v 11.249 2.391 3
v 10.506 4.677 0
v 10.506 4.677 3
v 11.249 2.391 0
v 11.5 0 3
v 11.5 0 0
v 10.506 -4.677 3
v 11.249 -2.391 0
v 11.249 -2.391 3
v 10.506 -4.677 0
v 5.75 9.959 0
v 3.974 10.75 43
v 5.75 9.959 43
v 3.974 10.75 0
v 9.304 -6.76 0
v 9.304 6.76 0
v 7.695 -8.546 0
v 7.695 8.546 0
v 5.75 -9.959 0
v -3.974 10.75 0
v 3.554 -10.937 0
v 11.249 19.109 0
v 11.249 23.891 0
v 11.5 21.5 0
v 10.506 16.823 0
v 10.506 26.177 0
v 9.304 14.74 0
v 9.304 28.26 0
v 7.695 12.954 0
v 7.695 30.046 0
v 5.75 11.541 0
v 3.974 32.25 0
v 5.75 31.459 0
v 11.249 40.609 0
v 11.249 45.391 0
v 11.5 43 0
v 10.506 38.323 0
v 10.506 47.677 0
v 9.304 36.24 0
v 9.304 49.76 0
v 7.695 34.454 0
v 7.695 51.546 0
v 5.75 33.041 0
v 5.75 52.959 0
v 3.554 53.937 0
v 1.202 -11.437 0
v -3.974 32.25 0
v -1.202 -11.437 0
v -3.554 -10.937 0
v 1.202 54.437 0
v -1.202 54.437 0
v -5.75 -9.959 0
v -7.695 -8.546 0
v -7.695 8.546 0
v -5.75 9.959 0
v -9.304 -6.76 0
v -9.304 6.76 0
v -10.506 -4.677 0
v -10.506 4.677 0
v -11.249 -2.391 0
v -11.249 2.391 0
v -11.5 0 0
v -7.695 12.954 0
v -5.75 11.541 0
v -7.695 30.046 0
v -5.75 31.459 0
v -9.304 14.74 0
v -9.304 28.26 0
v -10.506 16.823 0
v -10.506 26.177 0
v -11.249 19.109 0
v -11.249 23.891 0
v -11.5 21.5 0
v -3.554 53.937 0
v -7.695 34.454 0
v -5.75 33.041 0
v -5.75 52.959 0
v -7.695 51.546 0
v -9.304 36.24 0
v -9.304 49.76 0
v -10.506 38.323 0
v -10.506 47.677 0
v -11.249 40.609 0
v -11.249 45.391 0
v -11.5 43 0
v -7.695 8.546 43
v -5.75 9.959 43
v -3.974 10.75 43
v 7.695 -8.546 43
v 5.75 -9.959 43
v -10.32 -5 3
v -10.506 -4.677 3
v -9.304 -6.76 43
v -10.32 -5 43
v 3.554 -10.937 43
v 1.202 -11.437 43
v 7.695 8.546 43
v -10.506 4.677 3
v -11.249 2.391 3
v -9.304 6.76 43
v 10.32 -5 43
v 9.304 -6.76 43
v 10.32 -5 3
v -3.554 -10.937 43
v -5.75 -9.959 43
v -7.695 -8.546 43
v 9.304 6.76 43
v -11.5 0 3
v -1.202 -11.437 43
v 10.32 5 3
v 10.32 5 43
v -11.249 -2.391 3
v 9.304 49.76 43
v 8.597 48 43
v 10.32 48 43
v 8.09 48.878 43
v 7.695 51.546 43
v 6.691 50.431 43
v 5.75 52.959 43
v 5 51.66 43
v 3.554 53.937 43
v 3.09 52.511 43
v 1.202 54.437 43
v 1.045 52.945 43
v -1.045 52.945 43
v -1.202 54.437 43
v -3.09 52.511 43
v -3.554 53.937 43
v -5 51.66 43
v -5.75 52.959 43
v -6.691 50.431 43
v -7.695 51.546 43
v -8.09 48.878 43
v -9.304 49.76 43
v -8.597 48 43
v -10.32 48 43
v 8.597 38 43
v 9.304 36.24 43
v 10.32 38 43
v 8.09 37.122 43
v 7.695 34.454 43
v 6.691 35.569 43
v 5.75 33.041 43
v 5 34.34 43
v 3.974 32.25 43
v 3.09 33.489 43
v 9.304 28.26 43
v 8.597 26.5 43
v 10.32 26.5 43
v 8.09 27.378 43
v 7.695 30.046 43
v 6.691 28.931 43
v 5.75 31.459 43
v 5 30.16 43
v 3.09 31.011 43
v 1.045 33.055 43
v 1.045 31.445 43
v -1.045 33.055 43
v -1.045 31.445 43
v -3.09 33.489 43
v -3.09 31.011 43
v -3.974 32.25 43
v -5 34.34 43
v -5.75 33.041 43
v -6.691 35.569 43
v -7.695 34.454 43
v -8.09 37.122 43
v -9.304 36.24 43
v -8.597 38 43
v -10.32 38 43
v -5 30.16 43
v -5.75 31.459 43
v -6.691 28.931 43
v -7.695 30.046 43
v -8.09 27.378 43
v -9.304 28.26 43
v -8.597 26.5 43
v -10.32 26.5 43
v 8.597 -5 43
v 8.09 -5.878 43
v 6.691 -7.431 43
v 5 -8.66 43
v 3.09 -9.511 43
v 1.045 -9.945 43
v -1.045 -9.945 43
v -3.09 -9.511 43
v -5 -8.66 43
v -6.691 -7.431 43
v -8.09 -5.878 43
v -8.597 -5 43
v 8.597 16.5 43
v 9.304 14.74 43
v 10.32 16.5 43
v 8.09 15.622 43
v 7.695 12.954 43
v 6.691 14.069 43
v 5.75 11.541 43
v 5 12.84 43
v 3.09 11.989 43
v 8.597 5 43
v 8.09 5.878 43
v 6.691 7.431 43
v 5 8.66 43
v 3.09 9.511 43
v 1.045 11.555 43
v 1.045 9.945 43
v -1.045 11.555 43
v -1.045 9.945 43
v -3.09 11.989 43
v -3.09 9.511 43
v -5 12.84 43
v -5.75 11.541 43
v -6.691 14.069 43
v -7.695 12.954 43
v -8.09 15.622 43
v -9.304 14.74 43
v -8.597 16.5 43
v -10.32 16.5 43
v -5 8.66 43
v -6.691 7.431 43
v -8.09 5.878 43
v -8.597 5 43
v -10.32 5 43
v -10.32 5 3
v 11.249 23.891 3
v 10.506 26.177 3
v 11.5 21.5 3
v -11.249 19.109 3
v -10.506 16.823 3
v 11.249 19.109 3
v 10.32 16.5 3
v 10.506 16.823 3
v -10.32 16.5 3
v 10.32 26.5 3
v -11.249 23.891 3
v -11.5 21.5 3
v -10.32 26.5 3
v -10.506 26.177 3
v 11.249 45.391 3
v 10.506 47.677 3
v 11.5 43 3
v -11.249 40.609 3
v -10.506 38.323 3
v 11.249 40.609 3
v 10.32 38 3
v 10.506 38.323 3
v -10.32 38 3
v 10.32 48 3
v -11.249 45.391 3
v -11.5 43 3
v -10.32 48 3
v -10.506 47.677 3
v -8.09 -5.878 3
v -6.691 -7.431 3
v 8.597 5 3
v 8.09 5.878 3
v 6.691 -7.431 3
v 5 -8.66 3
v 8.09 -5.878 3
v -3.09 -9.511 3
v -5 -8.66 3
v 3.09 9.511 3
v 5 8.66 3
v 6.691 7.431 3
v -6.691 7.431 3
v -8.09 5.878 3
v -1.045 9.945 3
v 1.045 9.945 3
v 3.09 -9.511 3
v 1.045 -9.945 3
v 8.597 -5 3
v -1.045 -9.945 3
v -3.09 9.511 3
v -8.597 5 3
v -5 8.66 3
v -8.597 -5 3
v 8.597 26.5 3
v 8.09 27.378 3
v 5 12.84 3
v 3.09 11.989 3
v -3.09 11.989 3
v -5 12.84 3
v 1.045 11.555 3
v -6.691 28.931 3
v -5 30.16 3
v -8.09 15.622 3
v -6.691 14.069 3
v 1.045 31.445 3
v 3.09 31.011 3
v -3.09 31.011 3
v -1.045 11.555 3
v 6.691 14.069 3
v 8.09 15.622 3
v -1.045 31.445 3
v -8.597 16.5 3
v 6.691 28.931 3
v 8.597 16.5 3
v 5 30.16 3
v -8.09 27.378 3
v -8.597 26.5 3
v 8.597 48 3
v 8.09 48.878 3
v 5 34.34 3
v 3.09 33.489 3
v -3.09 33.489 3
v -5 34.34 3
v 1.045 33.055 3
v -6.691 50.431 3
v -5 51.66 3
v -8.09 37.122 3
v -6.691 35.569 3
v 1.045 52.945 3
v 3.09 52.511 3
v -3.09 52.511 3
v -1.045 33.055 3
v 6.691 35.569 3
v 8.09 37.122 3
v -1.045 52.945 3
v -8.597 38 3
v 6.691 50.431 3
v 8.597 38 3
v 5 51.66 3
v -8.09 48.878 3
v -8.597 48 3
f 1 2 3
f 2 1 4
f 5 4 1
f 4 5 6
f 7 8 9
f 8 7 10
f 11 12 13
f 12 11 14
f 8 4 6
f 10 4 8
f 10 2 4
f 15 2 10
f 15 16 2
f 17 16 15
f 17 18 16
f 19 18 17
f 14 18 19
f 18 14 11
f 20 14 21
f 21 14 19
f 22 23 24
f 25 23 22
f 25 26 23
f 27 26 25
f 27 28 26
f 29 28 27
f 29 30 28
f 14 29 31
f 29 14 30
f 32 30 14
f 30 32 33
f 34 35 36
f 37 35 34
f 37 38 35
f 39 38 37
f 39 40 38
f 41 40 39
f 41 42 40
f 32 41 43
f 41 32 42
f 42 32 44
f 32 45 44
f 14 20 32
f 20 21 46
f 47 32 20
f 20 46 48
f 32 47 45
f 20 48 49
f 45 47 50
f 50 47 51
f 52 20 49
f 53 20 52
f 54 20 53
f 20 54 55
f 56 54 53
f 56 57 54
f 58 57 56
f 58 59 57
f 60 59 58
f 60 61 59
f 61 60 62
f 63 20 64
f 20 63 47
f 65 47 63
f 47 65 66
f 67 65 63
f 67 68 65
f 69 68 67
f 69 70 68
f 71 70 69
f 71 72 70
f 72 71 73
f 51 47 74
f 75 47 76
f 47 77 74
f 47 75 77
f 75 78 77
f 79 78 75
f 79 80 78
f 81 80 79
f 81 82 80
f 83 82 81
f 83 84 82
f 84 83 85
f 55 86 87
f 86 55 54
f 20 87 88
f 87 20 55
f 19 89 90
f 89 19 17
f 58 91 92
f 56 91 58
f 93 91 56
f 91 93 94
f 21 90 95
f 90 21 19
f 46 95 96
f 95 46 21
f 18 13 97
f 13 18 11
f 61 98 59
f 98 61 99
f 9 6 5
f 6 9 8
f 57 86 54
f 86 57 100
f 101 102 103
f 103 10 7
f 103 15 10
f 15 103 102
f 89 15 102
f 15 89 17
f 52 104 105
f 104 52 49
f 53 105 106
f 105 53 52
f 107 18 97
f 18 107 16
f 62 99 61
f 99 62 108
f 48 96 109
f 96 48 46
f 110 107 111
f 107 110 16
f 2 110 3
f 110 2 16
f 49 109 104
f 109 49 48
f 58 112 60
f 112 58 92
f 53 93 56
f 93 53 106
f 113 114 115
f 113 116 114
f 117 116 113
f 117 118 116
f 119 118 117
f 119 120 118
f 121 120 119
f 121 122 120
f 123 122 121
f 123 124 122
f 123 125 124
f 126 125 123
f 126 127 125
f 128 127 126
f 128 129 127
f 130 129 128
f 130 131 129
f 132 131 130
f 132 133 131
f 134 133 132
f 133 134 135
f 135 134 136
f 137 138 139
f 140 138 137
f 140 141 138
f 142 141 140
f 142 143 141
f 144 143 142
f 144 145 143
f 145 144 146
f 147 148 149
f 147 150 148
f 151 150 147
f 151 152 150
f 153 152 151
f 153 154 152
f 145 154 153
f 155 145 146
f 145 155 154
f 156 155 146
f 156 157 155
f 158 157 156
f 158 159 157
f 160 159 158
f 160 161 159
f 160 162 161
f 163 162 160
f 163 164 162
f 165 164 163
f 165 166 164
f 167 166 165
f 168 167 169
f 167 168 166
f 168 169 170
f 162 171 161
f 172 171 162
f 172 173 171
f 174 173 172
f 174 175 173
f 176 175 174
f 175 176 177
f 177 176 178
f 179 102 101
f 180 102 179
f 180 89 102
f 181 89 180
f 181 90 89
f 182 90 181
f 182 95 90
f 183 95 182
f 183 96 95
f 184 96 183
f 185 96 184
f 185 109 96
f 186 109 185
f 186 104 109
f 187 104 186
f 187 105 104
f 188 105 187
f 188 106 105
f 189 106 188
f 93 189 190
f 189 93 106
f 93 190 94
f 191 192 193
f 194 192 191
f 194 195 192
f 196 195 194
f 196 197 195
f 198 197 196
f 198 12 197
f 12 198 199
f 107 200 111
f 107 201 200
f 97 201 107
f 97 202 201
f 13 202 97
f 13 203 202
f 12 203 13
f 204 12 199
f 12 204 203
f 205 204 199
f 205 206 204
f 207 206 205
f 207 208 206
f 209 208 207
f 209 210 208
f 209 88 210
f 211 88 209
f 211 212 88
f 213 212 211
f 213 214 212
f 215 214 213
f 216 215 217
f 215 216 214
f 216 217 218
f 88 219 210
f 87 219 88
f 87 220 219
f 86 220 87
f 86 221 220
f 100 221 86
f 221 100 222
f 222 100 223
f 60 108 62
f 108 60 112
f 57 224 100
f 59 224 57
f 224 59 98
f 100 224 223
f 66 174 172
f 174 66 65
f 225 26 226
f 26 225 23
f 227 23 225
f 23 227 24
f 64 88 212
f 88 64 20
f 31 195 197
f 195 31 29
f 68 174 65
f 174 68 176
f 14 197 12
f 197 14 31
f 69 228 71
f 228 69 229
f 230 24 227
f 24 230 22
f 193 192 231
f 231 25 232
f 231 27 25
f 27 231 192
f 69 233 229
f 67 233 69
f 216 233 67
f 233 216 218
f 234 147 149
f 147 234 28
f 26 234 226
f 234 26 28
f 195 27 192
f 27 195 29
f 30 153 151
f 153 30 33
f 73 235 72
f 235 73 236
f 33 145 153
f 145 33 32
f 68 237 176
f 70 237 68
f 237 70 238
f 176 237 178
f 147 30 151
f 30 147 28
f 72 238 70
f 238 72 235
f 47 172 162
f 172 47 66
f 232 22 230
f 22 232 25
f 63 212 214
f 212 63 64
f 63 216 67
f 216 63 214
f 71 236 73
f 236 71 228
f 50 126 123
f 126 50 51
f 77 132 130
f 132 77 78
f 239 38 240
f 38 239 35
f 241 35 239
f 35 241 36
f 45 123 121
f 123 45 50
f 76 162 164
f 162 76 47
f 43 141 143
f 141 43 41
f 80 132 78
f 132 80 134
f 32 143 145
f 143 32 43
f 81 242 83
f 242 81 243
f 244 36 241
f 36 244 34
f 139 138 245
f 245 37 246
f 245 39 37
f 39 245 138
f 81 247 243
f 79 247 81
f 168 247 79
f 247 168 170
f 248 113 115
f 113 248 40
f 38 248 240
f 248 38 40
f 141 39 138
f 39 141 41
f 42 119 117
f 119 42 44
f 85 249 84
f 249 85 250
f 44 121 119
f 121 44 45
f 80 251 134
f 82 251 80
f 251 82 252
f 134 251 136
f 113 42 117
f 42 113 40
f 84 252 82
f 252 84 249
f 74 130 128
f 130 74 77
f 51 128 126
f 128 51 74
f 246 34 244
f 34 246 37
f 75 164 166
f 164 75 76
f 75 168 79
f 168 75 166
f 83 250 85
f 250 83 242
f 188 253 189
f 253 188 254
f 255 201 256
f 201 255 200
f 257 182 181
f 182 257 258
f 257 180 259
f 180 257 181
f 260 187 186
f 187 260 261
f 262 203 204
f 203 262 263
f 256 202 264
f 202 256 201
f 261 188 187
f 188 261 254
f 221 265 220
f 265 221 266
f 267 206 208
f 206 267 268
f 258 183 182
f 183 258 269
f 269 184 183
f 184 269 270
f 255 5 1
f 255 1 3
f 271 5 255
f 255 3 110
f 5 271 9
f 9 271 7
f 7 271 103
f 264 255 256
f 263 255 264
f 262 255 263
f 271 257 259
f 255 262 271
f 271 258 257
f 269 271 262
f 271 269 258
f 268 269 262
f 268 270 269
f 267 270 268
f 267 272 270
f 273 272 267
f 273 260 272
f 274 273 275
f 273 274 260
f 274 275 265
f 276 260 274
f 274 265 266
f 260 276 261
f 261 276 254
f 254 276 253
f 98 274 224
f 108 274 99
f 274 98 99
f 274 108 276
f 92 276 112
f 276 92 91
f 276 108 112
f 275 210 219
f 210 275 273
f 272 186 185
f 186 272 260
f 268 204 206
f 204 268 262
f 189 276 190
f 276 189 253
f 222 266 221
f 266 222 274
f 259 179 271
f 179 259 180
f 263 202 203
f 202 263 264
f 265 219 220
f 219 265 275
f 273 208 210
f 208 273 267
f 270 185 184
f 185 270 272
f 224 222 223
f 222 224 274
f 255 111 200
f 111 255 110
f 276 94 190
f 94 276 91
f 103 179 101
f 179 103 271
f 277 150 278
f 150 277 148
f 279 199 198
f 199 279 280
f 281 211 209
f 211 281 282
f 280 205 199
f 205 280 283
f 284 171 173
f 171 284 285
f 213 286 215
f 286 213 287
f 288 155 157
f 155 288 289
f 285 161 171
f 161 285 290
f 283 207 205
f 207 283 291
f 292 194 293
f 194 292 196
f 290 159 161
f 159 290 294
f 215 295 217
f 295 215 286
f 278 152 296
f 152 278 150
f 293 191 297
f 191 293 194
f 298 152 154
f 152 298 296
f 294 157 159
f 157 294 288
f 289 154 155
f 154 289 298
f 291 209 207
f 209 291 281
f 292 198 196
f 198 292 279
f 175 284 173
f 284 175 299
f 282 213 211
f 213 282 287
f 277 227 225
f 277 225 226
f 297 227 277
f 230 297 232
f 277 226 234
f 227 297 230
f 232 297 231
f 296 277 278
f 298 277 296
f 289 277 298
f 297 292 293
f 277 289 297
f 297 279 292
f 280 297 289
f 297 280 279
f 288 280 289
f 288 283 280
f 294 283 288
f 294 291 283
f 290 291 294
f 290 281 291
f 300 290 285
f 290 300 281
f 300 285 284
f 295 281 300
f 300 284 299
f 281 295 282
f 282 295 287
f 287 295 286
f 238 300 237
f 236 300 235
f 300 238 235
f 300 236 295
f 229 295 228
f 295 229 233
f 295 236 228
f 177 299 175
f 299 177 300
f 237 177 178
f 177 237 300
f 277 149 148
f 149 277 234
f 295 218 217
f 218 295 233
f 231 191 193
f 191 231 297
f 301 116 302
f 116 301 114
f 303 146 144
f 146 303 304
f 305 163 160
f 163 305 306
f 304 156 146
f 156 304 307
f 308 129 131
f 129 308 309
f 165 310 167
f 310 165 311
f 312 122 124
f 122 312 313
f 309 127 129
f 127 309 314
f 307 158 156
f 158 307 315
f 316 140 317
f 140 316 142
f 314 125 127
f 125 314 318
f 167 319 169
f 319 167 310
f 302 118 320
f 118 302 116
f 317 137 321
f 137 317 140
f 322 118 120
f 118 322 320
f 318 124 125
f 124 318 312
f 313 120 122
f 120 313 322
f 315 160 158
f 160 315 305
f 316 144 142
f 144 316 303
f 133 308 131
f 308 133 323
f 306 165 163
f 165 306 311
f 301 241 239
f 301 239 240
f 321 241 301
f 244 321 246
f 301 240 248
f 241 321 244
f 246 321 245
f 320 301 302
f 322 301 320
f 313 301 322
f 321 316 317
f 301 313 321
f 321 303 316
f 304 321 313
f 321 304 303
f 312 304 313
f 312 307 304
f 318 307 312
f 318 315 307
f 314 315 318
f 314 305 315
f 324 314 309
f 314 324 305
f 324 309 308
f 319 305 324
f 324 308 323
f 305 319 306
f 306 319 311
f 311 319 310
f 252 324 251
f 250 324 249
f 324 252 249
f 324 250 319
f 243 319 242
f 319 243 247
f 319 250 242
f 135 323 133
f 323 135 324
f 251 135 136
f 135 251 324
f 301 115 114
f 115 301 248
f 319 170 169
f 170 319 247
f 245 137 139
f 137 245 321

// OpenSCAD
//
// Custom Circular Token Holder
//
// Copyright 2016 Julia Valencia
//
// Creative Commons Attribution-NonCommercial 3.0 Unported (CC BY-NC 3.0)
// http://creativecommons.org/licenses/by-nc/3.0/

//diameter(mm) of the hole for the token
diameter = 20;
//height(mm) of the holder
height = 40;
//how thick(mm) the walls are
thk = 3;
//how many holders?
count = 3;
//do you want it to be easily grabable? NOTE: this is to allow creativity! Like making a custom toilet paper holder! or a pencil holder! :D
grab = 1;// [1:Yes,0:No]

radius = diameter/2;
difference (){
    for(i=[0:1:count-1]){
     translate([0,(diameter+thk/2)*i,0])
       cylinder(h=height+thk, d = diameter+thk);
    }
    for(i=[0:1:count]){
     translate([0,(diameter+thk/2)*i,thk])
       cylinder(h=height, d = diameter);
     if (grab == 1){
      translate([-radius-thk/2,(diameter+thk/2)*i+(-radius/2),thk])
       cube([diameter+thk,radius,height]);
     }
    }
}
